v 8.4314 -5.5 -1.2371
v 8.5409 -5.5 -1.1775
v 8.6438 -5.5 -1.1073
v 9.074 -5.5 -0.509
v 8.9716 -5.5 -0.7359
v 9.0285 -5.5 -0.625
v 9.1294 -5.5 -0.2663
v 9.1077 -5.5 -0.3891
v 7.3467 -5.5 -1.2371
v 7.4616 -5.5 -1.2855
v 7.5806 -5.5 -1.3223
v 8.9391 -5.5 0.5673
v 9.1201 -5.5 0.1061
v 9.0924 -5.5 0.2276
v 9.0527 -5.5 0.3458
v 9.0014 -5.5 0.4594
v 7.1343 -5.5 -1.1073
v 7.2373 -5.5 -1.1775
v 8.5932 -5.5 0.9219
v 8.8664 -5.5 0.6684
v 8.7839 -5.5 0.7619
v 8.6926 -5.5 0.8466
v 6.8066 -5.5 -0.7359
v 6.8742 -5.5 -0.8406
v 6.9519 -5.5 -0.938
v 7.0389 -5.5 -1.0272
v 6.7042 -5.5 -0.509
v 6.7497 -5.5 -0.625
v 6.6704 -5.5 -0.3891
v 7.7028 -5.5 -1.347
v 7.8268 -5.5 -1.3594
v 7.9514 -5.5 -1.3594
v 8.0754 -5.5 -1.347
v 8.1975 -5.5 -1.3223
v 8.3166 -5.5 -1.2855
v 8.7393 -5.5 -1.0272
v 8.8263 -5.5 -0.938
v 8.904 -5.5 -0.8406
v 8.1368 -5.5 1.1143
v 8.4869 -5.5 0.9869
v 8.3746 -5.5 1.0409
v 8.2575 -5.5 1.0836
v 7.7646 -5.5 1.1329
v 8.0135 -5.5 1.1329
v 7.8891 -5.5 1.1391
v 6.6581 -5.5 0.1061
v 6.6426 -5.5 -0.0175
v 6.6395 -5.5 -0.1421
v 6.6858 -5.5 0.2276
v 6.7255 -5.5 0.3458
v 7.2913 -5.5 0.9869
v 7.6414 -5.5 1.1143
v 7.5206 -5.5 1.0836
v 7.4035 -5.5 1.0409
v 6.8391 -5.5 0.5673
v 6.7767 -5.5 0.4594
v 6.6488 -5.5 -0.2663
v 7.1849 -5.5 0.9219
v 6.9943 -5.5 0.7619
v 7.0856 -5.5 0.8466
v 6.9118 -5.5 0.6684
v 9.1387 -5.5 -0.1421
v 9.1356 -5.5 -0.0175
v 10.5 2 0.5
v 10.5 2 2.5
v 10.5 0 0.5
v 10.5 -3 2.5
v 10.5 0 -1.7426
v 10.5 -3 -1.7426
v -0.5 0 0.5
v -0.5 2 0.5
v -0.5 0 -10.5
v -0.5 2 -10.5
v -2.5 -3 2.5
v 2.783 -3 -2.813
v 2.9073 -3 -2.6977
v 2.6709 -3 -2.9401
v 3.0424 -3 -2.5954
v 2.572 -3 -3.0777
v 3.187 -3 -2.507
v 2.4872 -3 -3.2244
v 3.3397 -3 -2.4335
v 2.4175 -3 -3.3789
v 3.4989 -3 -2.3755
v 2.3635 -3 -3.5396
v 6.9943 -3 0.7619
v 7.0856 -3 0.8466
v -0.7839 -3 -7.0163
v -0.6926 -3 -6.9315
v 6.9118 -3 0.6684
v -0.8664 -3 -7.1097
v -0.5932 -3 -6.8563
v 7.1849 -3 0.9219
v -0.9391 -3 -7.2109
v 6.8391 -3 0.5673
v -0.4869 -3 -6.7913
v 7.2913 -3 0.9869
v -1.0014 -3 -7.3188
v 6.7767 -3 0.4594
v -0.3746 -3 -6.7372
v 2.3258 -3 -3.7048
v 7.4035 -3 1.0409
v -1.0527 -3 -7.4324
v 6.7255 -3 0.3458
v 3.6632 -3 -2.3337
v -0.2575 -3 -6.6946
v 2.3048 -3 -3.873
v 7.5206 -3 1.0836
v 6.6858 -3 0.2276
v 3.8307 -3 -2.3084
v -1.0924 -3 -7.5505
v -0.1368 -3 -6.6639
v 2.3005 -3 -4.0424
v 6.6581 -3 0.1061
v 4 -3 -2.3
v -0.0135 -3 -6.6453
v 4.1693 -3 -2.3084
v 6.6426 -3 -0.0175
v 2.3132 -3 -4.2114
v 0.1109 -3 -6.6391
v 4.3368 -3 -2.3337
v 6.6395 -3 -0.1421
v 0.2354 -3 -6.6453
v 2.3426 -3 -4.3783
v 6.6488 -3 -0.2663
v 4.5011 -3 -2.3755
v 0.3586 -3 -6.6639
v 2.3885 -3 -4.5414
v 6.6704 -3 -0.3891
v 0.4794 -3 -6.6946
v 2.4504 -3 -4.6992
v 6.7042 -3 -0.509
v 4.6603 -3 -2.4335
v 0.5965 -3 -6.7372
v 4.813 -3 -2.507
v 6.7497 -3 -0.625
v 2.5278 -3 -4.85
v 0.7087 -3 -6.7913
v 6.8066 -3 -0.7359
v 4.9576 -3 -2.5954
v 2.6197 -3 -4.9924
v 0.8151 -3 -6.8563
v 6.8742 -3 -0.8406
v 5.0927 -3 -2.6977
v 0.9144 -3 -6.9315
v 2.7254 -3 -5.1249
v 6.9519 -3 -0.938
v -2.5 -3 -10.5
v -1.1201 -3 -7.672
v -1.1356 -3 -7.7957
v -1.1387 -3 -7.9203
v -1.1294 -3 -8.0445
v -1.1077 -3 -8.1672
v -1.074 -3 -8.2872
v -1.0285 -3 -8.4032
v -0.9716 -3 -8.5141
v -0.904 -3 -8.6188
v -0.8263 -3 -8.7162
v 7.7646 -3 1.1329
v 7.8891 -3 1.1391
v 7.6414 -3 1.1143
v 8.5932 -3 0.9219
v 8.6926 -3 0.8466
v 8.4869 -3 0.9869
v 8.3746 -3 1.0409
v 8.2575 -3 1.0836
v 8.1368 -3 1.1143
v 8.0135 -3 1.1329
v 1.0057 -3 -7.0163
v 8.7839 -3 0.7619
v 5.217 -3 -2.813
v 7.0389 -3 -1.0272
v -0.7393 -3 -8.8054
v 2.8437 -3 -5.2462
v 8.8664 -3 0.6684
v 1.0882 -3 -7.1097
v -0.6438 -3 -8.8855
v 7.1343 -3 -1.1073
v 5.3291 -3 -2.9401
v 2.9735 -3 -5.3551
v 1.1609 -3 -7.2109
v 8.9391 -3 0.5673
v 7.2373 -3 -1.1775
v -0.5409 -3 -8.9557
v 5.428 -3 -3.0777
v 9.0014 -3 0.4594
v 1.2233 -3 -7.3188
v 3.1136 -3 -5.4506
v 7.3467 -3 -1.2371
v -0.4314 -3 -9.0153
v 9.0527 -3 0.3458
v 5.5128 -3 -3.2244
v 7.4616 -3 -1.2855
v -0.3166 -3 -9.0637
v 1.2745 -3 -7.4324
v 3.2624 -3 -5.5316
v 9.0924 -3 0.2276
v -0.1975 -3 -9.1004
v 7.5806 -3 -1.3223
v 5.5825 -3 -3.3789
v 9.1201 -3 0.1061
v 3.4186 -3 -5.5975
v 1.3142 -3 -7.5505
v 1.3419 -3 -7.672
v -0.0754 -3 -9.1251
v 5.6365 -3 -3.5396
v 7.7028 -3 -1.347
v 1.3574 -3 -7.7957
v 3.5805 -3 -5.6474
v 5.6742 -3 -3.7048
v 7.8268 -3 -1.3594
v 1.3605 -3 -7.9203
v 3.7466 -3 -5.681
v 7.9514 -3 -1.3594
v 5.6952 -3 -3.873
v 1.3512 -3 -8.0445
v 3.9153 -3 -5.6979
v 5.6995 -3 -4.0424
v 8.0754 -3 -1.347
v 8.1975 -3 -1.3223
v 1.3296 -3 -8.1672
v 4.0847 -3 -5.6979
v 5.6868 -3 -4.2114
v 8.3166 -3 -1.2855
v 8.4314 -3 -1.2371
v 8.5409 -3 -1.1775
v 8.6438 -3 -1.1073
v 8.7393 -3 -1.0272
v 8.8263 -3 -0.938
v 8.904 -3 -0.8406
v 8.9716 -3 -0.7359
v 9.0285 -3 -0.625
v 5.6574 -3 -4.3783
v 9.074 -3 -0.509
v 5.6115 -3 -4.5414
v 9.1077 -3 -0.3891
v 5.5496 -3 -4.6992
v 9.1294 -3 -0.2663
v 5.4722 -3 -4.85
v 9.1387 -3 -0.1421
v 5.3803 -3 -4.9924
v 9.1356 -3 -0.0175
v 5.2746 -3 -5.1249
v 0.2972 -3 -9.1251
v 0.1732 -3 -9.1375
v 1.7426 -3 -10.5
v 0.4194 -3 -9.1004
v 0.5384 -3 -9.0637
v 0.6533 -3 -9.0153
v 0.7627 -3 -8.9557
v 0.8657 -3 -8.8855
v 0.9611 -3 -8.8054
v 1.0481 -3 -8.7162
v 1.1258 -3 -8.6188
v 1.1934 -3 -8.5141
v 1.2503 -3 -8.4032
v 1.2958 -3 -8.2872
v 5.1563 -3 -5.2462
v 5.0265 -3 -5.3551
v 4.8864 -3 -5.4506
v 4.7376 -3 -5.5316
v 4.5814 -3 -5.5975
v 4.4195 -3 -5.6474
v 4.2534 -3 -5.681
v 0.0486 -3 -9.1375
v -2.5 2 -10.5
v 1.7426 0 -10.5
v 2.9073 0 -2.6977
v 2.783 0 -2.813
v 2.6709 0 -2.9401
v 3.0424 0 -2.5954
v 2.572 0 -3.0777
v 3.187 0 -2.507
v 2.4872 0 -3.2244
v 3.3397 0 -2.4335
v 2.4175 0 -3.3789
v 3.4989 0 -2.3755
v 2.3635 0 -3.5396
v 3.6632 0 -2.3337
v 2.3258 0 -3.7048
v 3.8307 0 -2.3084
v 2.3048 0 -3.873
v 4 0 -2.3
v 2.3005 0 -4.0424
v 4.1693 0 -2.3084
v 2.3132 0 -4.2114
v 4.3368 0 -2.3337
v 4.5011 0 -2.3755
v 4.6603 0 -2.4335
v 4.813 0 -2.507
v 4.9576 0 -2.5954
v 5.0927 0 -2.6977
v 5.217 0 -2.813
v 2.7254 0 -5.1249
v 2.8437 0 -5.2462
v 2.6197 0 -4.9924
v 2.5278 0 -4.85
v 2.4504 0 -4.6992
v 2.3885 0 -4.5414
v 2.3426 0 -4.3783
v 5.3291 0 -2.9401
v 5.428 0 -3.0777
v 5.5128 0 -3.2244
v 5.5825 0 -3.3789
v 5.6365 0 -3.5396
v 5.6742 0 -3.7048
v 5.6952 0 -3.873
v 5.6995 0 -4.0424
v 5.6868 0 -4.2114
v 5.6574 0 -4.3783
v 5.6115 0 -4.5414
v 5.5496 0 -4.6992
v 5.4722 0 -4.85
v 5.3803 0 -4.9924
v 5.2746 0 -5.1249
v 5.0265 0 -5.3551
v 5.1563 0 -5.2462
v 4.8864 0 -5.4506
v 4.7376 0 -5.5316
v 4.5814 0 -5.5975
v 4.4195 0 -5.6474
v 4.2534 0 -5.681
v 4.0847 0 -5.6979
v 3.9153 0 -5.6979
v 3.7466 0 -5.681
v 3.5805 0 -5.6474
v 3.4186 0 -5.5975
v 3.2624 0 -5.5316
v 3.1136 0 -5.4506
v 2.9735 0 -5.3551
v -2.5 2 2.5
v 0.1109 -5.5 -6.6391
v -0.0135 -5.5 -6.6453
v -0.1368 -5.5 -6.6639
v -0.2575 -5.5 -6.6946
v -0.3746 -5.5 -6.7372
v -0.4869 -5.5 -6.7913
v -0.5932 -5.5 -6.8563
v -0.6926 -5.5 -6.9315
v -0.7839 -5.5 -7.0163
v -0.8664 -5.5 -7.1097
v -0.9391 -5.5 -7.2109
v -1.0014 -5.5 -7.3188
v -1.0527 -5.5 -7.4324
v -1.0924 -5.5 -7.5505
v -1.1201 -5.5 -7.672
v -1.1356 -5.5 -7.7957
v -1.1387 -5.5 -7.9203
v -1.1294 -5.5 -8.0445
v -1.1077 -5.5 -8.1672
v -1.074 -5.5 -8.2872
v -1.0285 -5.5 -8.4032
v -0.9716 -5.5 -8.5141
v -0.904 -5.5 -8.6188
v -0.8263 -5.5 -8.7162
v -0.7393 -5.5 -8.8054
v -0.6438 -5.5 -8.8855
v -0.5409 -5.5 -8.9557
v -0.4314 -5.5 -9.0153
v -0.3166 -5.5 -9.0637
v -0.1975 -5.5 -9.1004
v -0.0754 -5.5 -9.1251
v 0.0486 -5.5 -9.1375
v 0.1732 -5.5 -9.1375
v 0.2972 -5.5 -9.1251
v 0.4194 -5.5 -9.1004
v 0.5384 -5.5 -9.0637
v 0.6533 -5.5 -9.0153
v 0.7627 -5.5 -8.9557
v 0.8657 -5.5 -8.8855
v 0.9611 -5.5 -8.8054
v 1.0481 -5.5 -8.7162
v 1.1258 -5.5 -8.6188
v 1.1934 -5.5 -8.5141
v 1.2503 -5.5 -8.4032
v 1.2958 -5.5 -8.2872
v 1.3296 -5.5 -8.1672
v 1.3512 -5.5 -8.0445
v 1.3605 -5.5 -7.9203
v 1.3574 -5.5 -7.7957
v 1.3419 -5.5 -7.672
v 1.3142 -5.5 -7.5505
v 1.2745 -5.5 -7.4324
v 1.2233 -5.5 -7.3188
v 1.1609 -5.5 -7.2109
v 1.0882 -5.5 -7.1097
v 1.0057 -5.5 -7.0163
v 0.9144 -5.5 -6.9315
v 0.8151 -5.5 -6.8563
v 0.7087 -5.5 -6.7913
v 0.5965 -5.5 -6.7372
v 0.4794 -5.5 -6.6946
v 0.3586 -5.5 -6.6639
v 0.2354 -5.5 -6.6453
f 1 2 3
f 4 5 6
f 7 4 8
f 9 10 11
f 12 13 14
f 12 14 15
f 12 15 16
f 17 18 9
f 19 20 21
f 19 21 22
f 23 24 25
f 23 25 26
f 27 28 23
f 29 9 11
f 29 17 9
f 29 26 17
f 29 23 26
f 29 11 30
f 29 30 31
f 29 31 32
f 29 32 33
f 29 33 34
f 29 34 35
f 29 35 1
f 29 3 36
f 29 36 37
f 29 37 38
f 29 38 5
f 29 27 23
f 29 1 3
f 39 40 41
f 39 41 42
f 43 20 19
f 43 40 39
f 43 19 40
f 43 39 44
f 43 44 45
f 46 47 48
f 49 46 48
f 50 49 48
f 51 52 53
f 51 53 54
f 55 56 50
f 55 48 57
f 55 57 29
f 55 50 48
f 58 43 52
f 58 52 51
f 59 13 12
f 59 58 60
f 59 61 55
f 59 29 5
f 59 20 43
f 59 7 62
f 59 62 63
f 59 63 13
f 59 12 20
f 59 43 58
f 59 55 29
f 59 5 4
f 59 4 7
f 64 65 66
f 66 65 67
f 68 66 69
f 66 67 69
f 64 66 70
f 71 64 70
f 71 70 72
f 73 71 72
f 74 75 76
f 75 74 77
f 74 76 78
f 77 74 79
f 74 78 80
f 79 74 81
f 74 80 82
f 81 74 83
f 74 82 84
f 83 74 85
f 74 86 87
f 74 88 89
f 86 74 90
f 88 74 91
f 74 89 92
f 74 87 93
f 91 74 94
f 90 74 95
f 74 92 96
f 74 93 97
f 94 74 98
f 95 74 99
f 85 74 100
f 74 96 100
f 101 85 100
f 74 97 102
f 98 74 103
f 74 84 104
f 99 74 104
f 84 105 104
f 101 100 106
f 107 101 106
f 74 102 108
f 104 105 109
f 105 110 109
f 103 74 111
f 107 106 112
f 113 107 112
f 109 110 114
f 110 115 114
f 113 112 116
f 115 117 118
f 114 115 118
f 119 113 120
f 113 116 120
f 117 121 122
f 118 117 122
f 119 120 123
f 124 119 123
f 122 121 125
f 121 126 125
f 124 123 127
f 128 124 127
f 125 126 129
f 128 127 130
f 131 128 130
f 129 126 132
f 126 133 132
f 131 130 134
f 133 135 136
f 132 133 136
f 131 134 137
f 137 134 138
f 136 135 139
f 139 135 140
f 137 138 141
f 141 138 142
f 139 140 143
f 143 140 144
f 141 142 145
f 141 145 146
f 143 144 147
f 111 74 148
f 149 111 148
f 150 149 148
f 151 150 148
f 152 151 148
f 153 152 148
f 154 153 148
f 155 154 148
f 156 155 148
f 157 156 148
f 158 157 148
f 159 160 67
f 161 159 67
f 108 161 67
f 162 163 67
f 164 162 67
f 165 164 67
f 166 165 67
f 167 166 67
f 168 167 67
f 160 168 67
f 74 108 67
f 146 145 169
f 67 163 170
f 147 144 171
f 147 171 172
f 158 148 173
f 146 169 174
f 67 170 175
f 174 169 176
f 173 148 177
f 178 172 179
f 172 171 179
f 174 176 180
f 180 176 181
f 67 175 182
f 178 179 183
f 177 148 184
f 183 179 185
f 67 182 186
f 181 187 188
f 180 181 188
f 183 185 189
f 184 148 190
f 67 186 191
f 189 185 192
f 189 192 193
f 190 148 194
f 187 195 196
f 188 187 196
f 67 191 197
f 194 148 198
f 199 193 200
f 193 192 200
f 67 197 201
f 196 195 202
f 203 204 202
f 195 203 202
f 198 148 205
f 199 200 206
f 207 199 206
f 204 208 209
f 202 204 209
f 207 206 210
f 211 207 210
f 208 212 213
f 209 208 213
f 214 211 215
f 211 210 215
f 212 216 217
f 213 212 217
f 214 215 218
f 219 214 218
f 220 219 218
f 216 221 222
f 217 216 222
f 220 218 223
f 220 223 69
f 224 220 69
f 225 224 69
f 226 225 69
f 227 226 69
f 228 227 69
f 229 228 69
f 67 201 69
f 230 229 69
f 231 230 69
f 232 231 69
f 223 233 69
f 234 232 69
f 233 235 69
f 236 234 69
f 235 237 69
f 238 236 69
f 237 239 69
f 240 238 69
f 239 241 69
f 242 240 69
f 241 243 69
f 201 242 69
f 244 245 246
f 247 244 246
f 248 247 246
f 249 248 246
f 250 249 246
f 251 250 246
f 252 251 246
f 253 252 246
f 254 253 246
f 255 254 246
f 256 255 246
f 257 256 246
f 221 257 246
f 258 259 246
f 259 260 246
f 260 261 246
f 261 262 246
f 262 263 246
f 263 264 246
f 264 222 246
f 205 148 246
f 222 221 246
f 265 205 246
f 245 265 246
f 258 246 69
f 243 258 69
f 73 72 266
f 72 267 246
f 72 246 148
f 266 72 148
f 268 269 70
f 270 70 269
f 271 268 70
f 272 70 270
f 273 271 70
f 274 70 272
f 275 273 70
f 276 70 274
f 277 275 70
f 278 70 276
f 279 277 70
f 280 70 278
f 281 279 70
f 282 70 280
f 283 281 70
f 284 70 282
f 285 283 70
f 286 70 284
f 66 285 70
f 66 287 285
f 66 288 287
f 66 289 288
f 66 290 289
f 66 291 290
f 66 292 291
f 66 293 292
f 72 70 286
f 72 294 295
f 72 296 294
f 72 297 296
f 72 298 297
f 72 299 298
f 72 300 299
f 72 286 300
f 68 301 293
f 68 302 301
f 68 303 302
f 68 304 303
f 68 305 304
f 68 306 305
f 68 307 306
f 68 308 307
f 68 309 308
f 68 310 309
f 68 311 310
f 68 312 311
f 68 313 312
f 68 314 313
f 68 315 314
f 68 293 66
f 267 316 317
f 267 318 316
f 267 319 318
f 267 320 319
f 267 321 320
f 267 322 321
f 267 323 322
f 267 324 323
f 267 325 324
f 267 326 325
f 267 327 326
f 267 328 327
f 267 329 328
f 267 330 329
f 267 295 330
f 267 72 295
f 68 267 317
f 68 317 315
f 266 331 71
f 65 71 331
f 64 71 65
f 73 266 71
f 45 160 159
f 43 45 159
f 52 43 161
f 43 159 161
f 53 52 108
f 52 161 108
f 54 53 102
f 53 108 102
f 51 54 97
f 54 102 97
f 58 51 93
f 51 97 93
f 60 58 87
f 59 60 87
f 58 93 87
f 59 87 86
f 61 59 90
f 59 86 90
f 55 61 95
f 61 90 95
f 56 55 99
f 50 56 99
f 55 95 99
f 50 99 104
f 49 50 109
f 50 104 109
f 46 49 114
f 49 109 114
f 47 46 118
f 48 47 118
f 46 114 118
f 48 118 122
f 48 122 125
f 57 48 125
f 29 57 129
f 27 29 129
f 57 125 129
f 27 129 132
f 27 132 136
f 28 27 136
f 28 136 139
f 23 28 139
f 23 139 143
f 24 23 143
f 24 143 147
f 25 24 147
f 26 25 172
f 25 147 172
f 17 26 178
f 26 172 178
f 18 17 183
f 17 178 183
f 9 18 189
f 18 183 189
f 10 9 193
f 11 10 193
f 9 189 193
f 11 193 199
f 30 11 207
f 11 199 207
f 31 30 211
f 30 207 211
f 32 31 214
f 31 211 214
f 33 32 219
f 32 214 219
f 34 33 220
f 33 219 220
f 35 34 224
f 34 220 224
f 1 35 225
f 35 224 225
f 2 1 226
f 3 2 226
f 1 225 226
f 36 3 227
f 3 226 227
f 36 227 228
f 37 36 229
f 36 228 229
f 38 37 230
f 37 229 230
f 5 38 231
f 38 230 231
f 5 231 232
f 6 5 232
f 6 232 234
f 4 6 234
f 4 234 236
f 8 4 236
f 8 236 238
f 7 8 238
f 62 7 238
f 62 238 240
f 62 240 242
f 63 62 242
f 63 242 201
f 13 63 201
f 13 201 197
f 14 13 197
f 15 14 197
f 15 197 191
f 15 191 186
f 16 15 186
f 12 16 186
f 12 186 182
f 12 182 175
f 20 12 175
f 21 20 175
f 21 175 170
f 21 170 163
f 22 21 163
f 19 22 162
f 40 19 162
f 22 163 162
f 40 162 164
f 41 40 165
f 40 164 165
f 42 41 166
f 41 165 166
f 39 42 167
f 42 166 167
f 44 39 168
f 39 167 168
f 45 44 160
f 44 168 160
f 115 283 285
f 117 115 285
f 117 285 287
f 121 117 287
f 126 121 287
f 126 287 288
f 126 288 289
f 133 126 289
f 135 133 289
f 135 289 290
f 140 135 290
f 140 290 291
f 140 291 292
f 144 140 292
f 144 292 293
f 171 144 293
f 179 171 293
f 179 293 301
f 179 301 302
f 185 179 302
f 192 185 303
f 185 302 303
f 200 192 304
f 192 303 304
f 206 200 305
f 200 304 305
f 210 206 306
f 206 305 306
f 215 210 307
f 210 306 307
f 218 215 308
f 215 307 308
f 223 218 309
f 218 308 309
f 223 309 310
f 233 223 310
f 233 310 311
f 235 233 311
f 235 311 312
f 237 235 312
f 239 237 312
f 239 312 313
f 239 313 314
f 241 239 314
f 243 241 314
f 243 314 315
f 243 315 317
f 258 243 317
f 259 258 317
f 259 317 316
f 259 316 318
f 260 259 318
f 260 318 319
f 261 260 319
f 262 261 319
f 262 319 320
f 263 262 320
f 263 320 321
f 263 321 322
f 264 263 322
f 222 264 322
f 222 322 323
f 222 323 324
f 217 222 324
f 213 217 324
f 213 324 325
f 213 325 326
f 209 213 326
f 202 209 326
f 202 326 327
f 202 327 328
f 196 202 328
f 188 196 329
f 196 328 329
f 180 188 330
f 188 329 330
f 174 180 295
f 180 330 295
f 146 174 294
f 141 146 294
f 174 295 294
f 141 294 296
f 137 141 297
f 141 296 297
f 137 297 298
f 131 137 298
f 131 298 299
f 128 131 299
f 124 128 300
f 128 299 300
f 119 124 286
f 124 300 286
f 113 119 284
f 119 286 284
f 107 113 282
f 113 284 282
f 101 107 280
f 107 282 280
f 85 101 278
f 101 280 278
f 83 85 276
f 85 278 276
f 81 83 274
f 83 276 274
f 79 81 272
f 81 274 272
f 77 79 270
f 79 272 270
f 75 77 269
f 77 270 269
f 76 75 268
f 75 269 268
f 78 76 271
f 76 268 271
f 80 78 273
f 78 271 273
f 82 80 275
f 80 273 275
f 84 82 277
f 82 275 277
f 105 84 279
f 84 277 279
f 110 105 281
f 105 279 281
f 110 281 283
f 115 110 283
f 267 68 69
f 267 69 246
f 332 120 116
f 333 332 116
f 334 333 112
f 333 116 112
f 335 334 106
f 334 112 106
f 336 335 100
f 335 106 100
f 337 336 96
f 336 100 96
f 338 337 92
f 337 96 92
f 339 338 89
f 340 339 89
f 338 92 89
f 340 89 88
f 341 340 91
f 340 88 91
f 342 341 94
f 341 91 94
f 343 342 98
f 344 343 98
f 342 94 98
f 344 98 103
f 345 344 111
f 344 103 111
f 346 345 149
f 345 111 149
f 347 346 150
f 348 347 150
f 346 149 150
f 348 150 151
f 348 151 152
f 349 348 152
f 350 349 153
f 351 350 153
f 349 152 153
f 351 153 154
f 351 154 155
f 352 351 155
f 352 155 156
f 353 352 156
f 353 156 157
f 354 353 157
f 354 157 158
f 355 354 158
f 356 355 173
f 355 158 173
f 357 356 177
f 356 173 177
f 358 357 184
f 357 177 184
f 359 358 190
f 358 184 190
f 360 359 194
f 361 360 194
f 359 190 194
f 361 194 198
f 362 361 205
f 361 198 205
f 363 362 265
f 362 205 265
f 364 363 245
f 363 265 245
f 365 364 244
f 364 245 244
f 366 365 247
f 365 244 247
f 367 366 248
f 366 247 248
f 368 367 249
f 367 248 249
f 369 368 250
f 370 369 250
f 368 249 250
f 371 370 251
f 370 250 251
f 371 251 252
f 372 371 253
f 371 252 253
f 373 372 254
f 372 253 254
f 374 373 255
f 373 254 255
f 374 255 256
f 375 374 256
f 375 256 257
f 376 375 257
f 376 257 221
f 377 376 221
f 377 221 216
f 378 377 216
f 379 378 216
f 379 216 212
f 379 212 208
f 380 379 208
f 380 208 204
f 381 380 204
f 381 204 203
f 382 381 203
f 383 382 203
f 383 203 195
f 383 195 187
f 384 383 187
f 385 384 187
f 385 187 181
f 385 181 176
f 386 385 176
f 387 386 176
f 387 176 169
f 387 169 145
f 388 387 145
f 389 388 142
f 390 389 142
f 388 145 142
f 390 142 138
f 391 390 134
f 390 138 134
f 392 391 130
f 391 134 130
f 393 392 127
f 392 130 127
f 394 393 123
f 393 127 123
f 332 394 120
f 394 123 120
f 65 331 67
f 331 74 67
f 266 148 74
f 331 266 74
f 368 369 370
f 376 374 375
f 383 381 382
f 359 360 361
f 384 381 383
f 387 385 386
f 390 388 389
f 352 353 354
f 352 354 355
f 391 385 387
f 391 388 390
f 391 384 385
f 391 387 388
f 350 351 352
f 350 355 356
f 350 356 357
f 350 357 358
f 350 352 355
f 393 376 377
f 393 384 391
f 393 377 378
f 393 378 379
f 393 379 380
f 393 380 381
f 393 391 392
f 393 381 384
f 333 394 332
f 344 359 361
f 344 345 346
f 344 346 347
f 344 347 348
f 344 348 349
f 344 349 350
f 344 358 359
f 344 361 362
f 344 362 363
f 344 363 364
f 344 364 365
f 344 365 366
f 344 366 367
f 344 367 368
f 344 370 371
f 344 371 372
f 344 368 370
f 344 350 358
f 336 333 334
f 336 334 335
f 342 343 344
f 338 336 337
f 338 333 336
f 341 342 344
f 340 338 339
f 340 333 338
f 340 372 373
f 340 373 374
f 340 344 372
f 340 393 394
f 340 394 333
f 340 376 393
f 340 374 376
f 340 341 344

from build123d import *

# Parameters (mm, degrees)
BOSS_EXTRUDE2_DEPTH = 3
SKETCH4_R           = 1.25
BOSS_EXTRUDE3_DEPTH = 2.5
BOSS_EXTRUDE4_DEPTH = 2
CUT_EXTRUDE1_REACH  = 17.835
SKETCH6_R           = 1.7


with BuildPart() as part:
    # Sketch3 → Boss-Extrude2 (new body)
    with BuildSketch(Plane(origin=(0, 0, 0), x_dir=(1, 0, 0), z_dir=(0, 1, 0))):
        Polygon((-2.5, 10.5), (-2.5, -2.5), (10.5, -2.5), (10.5, 1.742640687), (1.742640687, 10.5), align=None)
    extrude(amount=-BOSS_EXTRUDE2_DEPTH)

    # Sketch4 → Boss-Extrude3 (add)
    with BuildSketch(Plane.XZ.offset(3)):
        with Locations(Location((7.889087297, -0.110912703, 0), (0, 0, 90))):
            Circle(SKETCH4_R)
        with Locations(Location((0.110912703, -7.889087297, 0), (0, 0, 90))):
            Circle(SKETCH4_R)
    extrude(amount=BOSS_EXTRUDE3_DEPTH)

    # Sketch5 → Boss-Extrude4 (add)
    with BuildSketch(Plane(origin=(0, 0, 0), x_dir=(1, 0, 0), z_dir=(0, 1, 0))):
        Polygon((-2.5, 10.5), (-2.5, -2.5), (10.5, -2.5), (10.5, -0.5), (-0.5, -0.5), (-0.5, 10.5), align=None)
    extrude(amount=BOSS_EXTRUDE4_DEPTH)

    # Sketch6 → Cut-Extrude1 (cut, up to next)
    with BuildSketch(Plane(origin=(0, 0, 0), x_dir=(1, 0, 0), z_dir=(0, 1, 0)), mode=Mode.PRIVATE) as cut_extrude1_sk1:
        with Locations(Location((4, 4, 0), (0, 0, 270))):
            Circle(SKETCH6_R)
    cut_extrude1_tool1 = extrude(cut_extrude1_sk1.sketch, amount=-CUT_EXTRUDE1_REACH, mode=Mode.PRIVATE) & part.part
    add(cut_extrude1_tool1.solids().sort_by_distance((4, 0, -4))[0], mode=Mode.SUBTRACT)


solid = part.part
